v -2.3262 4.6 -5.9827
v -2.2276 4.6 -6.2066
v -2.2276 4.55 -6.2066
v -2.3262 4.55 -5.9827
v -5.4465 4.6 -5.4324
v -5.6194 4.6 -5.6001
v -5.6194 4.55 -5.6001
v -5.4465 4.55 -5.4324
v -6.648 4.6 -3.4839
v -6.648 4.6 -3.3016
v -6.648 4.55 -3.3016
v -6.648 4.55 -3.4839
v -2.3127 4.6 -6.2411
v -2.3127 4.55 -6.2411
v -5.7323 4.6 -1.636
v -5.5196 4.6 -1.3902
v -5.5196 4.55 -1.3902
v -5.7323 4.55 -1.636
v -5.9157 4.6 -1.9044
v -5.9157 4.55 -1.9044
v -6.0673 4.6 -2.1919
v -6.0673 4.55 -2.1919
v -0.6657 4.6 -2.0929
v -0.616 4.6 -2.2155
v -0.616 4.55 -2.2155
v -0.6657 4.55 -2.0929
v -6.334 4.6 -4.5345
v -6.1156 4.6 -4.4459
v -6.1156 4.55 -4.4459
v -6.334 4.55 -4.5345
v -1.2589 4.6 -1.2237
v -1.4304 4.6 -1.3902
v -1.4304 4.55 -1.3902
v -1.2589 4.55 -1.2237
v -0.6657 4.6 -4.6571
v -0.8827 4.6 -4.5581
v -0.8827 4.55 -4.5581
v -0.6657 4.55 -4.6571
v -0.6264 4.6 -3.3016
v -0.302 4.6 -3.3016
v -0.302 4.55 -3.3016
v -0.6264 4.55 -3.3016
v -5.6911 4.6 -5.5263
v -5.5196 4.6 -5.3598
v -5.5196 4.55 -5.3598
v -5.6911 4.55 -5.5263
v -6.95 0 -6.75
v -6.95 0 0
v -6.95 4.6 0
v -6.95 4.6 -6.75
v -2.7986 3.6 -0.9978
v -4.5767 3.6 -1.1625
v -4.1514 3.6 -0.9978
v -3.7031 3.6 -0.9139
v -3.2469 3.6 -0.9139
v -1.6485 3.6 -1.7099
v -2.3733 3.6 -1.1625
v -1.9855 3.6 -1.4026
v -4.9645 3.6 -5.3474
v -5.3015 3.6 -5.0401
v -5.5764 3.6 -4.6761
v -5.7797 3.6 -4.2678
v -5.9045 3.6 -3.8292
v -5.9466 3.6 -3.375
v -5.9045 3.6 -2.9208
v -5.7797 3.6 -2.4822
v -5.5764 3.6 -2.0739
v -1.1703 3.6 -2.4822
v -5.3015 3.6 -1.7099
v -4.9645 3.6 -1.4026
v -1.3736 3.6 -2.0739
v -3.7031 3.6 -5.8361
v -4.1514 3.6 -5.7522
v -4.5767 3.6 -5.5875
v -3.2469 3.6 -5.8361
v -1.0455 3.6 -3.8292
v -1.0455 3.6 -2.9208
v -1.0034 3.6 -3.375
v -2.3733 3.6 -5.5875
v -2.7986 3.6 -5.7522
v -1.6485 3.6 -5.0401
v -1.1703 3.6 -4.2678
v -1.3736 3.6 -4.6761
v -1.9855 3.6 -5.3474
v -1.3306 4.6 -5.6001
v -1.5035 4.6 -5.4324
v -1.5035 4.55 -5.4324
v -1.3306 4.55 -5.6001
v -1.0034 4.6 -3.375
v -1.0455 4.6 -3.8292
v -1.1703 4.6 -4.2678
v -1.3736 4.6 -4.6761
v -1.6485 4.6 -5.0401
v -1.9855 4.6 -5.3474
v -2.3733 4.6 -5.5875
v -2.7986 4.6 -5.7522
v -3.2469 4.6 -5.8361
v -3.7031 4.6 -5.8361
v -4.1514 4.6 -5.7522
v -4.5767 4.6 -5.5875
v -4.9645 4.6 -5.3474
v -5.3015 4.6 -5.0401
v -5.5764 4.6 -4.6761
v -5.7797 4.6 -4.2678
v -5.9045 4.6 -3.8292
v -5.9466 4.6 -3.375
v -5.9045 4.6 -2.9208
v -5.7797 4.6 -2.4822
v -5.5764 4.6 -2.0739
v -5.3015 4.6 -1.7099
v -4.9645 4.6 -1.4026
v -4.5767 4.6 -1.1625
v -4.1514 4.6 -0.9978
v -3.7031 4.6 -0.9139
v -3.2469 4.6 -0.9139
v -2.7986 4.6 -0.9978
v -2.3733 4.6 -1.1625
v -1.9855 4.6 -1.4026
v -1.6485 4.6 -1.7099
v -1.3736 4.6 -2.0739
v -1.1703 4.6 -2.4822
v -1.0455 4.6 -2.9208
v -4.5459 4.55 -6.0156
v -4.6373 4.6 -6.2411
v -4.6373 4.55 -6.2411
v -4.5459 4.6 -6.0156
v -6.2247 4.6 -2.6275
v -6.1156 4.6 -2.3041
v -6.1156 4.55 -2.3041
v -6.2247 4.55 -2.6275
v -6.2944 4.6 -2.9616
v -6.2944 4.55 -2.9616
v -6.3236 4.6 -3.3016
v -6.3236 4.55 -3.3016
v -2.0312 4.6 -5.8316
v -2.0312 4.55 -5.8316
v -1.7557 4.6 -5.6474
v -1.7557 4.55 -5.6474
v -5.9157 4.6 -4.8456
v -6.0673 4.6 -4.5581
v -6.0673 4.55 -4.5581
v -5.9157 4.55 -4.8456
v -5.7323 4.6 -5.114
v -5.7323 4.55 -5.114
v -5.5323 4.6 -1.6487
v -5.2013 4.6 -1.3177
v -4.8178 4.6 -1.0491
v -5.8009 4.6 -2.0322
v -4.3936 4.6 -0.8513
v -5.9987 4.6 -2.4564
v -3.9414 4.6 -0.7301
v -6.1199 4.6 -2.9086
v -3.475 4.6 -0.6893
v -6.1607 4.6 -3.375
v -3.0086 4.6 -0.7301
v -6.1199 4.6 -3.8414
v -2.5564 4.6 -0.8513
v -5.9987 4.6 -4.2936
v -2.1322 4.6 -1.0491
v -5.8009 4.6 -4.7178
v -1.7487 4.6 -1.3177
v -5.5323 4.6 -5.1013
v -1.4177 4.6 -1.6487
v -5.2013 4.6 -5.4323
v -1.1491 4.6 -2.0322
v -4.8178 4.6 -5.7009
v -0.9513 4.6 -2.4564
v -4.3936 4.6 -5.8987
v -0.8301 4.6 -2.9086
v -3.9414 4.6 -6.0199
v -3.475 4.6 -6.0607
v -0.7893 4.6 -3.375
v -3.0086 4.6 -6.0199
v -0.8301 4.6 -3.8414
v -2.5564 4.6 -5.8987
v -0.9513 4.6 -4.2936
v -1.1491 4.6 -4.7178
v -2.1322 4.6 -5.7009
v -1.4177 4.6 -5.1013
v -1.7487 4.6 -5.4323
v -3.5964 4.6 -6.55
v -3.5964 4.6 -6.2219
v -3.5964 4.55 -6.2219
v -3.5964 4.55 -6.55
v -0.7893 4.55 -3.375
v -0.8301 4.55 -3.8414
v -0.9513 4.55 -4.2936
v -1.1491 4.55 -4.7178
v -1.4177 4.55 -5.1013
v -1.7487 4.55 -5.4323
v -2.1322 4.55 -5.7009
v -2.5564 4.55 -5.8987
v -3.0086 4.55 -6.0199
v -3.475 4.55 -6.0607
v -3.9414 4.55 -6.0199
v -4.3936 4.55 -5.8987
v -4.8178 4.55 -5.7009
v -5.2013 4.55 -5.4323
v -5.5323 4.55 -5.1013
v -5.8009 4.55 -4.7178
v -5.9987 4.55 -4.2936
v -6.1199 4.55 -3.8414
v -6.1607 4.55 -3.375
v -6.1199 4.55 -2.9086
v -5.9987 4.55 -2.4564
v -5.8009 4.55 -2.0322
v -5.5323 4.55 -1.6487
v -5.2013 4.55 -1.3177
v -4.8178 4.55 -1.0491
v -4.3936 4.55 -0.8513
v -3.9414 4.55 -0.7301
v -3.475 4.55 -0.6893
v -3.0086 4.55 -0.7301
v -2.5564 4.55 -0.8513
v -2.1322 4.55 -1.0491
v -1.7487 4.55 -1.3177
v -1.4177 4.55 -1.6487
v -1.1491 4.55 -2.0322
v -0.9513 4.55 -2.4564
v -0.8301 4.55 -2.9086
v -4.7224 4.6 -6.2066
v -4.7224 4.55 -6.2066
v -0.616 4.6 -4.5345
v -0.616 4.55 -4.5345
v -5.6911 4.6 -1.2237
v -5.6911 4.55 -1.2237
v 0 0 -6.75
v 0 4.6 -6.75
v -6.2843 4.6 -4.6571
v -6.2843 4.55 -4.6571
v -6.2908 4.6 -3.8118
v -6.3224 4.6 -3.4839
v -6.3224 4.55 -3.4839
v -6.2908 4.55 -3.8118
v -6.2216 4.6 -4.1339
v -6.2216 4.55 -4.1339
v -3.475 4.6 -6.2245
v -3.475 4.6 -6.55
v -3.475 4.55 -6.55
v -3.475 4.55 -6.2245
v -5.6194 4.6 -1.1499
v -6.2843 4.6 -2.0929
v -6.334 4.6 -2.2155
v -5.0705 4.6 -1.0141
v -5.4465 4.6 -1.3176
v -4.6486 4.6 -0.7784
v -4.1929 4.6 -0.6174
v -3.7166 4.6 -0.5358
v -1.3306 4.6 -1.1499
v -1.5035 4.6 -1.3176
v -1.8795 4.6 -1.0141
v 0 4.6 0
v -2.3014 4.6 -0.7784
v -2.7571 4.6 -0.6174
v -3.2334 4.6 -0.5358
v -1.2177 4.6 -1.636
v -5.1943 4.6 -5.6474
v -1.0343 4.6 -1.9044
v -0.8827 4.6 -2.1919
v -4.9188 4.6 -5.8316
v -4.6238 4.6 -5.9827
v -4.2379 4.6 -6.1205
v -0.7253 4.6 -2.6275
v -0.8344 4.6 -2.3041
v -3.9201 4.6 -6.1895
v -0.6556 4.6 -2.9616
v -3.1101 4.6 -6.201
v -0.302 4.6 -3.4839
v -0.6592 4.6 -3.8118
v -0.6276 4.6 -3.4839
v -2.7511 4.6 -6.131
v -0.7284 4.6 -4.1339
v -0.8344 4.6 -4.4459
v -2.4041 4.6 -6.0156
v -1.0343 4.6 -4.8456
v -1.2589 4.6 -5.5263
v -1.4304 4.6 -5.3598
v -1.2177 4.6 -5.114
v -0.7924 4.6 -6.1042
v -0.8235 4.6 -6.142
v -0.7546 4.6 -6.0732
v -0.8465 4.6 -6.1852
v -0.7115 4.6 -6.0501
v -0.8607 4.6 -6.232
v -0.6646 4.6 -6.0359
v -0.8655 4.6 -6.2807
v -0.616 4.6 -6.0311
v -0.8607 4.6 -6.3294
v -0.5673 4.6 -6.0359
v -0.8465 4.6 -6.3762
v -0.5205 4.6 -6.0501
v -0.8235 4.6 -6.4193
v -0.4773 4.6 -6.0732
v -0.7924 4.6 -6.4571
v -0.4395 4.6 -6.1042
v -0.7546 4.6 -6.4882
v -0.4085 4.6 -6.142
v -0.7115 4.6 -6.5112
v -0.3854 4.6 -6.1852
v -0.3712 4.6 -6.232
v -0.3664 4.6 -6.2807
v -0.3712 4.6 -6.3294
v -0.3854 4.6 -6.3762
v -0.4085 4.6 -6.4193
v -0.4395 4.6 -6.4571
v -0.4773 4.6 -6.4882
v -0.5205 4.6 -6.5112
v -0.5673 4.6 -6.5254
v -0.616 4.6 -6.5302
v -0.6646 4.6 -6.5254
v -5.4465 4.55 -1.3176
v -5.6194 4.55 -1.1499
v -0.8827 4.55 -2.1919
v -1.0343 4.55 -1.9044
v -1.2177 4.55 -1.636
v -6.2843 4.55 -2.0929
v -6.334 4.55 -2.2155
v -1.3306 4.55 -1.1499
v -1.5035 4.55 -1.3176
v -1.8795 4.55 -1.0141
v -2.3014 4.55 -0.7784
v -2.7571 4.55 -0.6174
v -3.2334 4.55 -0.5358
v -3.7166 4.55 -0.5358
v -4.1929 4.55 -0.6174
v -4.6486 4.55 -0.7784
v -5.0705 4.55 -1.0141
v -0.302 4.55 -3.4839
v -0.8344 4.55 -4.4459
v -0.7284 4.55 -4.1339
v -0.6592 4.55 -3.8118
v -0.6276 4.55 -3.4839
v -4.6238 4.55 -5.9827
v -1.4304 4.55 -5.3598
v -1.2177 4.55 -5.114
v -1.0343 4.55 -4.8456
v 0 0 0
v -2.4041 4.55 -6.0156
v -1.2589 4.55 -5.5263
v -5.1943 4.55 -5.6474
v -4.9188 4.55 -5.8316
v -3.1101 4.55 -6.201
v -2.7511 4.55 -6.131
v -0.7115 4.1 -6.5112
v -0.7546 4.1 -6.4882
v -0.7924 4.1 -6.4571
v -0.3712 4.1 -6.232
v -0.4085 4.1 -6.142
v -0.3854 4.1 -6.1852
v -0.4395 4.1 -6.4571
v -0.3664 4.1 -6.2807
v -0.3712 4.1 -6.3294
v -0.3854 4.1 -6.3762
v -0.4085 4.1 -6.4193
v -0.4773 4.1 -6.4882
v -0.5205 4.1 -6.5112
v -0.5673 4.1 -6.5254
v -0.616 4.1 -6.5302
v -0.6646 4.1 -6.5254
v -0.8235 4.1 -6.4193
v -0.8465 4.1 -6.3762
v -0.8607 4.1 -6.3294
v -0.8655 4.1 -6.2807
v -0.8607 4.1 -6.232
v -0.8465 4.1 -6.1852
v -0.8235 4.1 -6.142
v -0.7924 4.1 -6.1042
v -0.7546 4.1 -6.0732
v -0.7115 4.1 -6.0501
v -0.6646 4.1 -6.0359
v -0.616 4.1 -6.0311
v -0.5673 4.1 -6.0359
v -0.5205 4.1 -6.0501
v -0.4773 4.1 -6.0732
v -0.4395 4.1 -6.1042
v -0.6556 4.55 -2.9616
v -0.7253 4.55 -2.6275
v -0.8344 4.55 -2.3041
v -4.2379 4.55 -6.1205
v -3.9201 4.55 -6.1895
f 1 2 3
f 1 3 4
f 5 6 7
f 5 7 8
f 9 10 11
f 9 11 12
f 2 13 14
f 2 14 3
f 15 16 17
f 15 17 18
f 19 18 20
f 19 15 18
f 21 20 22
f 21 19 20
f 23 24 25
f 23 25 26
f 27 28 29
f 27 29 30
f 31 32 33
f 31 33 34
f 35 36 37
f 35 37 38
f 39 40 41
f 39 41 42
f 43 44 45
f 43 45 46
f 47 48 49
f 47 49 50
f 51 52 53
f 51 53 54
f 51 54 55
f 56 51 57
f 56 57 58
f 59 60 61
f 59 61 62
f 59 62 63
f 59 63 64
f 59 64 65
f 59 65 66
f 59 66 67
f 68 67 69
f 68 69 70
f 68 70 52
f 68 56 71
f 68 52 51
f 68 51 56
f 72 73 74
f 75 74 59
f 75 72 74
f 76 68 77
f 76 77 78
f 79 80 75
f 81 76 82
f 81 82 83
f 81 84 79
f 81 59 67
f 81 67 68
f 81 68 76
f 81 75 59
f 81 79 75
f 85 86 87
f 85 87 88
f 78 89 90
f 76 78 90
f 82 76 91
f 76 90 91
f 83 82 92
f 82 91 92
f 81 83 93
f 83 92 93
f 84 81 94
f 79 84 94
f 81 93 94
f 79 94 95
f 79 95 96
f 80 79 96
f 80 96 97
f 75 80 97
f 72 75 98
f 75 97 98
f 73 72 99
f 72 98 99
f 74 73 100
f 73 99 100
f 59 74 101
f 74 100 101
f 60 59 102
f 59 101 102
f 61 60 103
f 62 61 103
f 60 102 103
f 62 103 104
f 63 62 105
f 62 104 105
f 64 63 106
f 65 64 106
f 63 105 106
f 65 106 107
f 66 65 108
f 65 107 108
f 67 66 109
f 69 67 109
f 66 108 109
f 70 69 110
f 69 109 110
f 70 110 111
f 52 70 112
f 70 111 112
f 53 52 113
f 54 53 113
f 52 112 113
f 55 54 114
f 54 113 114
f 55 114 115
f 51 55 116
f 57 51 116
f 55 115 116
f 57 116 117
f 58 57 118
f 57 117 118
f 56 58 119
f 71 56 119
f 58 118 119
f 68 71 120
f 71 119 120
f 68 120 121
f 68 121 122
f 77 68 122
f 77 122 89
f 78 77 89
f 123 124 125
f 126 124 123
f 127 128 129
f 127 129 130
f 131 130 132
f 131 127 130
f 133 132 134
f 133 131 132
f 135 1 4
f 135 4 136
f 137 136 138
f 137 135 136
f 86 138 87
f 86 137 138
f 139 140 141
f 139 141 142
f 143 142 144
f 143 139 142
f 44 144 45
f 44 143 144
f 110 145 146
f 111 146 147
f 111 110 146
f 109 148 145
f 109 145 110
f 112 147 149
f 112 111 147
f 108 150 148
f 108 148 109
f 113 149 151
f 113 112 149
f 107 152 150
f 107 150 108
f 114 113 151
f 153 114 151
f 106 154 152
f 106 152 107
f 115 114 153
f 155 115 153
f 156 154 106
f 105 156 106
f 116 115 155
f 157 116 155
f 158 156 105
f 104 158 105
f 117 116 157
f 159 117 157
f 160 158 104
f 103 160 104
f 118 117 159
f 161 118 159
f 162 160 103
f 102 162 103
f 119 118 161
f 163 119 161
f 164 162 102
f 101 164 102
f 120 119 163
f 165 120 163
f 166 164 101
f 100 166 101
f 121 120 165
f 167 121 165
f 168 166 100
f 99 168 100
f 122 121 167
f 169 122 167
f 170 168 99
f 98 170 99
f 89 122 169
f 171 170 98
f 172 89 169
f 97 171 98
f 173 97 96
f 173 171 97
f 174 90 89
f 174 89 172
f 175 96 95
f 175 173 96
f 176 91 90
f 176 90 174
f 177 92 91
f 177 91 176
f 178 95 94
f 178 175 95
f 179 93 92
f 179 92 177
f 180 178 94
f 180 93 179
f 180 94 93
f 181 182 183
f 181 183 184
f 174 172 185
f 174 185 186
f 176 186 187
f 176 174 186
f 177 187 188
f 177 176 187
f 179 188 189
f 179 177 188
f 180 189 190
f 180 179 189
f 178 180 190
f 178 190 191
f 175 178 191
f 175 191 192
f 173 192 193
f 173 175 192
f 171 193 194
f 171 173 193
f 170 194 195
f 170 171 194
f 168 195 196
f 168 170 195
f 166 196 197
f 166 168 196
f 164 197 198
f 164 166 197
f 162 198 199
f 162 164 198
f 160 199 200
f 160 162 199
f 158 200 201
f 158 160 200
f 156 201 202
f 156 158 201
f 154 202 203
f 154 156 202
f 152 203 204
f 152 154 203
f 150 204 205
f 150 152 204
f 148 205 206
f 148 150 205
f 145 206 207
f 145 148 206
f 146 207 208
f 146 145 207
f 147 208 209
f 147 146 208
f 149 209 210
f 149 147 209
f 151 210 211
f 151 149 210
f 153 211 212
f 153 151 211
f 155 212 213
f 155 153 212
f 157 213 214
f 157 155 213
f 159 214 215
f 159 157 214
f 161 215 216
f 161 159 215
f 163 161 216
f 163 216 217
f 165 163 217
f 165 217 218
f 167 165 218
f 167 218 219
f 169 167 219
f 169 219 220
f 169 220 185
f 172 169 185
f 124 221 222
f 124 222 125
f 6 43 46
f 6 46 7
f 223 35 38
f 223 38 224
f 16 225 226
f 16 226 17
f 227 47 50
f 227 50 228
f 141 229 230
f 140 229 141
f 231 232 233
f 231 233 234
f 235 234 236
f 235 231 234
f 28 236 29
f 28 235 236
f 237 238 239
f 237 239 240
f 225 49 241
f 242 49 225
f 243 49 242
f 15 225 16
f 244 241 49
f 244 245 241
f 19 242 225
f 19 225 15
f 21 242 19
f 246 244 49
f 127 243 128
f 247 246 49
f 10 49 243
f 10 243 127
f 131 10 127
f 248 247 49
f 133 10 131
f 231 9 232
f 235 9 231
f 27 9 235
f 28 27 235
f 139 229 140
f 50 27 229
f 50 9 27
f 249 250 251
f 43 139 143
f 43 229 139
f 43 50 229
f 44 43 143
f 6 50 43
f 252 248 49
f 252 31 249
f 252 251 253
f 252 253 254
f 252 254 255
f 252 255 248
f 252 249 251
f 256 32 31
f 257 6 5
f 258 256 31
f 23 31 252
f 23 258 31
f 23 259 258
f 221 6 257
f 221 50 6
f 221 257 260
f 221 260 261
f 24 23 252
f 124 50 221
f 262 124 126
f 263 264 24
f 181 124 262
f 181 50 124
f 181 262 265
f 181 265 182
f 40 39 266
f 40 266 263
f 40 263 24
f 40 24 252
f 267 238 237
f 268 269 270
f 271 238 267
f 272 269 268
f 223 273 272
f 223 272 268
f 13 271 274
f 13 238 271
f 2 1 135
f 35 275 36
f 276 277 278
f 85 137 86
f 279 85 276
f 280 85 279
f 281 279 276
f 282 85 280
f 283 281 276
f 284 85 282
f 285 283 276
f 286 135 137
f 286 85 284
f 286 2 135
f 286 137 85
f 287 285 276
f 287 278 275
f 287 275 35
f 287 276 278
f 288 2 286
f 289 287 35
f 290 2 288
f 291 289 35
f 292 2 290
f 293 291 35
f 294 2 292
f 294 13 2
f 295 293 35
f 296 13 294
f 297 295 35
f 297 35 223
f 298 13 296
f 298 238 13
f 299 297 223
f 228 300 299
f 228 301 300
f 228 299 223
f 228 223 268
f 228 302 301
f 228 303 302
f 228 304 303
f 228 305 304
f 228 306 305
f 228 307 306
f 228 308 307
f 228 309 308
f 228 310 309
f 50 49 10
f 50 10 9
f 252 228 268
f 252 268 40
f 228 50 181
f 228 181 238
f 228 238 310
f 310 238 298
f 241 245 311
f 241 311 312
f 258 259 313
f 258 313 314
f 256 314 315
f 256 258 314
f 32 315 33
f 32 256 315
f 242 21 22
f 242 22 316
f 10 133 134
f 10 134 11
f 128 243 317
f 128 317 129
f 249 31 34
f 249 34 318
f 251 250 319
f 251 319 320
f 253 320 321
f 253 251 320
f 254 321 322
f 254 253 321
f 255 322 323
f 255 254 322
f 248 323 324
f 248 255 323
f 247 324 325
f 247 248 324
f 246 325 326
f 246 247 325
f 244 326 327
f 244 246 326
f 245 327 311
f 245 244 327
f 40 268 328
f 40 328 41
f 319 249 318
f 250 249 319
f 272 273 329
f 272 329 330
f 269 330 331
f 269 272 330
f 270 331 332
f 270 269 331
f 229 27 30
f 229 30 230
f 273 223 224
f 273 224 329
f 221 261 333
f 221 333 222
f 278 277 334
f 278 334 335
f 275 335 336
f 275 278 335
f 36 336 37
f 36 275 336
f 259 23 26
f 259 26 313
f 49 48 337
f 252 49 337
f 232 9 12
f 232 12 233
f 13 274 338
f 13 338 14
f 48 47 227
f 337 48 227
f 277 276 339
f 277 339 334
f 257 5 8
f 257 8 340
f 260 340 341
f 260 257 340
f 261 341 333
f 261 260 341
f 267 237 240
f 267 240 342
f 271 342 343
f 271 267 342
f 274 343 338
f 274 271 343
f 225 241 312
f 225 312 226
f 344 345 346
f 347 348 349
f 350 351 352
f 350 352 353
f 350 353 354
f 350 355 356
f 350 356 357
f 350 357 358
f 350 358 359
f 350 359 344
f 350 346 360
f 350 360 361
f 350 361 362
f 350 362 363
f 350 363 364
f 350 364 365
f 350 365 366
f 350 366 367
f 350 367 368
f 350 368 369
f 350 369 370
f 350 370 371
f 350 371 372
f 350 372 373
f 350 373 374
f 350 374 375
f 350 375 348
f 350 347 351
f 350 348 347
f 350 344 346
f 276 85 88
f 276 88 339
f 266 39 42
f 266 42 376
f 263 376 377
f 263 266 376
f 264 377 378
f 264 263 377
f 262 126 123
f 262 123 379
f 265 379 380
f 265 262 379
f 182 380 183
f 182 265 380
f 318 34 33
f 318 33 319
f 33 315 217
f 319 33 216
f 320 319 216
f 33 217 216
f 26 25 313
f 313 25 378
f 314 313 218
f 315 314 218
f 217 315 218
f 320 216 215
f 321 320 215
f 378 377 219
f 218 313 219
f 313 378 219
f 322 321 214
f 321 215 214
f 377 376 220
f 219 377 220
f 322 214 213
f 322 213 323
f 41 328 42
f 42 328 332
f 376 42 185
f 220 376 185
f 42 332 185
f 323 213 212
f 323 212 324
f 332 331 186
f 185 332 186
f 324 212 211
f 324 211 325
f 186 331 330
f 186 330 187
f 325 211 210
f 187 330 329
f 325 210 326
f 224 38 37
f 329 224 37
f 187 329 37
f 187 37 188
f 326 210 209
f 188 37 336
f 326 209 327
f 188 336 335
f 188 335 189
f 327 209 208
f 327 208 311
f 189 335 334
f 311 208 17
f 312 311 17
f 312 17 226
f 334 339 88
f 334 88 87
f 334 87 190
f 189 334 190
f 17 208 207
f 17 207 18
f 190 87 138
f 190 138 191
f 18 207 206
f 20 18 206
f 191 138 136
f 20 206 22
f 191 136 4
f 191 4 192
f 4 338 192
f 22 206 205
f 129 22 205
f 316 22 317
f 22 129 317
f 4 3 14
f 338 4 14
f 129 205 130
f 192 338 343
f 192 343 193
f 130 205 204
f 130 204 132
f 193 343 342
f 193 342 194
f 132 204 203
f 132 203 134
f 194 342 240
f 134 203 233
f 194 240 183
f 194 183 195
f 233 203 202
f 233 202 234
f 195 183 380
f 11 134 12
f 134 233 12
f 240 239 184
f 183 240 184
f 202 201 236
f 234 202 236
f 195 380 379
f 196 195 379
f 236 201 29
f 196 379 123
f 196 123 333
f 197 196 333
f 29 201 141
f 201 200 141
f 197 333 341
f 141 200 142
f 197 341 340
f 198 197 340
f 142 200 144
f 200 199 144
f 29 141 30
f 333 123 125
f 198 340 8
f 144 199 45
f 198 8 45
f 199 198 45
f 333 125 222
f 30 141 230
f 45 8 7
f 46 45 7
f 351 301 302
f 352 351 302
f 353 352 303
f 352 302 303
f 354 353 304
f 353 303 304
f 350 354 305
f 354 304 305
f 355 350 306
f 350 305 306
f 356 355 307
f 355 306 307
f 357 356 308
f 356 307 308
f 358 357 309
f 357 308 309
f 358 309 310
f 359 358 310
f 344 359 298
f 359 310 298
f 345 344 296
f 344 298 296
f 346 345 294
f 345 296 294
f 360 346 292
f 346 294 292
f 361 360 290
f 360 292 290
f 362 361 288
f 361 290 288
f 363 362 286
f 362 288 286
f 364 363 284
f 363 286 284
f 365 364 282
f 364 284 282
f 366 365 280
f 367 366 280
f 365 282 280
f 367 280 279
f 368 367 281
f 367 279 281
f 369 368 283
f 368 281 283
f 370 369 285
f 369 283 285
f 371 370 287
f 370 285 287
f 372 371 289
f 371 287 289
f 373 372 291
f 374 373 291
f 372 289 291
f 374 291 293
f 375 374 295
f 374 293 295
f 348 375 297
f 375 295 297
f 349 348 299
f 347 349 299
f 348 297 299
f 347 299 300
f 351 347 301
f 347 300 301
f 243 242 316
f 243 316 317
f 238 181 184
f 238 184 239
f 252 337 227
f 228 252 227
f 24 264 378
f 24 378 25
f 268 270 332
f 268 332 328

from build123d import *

# Parameters (mm, degrees)
SKETCH1_W           = 6.95
SKETCH1_H           = 6.75
BOSS_EXTRUDE1_DEPTH = 4.6
SKETCH3_3_R         = 2.685665185
CUT_EXTRUDE3_DEPTH  = 0.05
SKETCH3_4_R         = 2.471595258
CUT_EXTRUDE4_DEPTH  = 1
SKETCH3_R           = 0.249549506
CUT_EXTRUDE5_DEPTH  = 0.5


with BuildPart() as part:
    # Sketch1 → Boss-Extrude1 (new body)
    with BuildSketch(Plane(origin=(0, 0, 0), x_dir=(1, 0, 0), z_dir=(0, 1, 0))):
        with Locations((-3.475, 3.375)):
            Rectangle(SKETCH1_W, SKETCH1_H)
    extrude(amount=BOSS_EXTRUDE1_DEPTH)

    # Sketch3<3> → Cut-Extrude3 (cut)
    with BuildSketch(Plane(origin=(0, 4.6, 0), x_dir=(1, 0, 0), z_dir=(0, 1, 0))):
        with BuildLine():
            Line((-2.404106083, 6.015623034), (-2.312667033, 6.241094539))
            Line((-2.312667033, 6.241094539), (-2.227566093, 6.2065822))
            Line((-2.227566093, 6.2065822), (-2.326206207, 5.982676477))
            ThreePointArc((-2.326206207, 5.982676477), (-1.890758445, 5.743519048), (-1.50346617, 5.432366798))
            Line((-1.50346617, 5.432366798), (-1.330630635, 5.60014662))
            Line((-1.330630635, 5.60014662), (-1.258910519, 5.52626536))
            Line((-1.258910519, 5.52626536), (-1.430410767, 5.359781765))
            ThreePointArc((-1.430410767, 5.359781765), (-1.122158532, 4.982432988), (-0.882700889, 4.558084573))
            Line((-0.882700889, 4.558084573), (-0.665701499, 4.657119684))
            Line((-0.665701499, 4.657119684), (-0.615961925, 4.534471247))
            Line((-0.615961925, 4.534471247), (-0.834376966, 4.445893916))
            ThreePointArc((-0.834376966, 4.445893916), (-0.689137564, 3.973894209), (-0.627572536, 3.483906499))
            Line((-0.627572536, 3.483906499), (-0.302033066, 3.483906499))
            Line((-0.302033066, 3.483906499), (-0.302033066, 3.301563496))
            Line((-0.302033066, 3.301563496), (-0.626437053, 3.301563496))
            ThreePointArc((-0.626437053, 3.301563496), (-0.685462224, 2.793465152), (-0.834376966, 2.304106084))
            Line((-0.834376966, 2.304106084), (-0.615961925, 2.215528753))
            Line((-0.615961925, 2.215528753), (-0.665701499, 2.092880316))
            Line((-0.665701499, 2.092880316), (-0.882700889, 2.191915427))
            ThreePointArc((-0.882700889, 2.191915427), (-1.122158532, 1.767567012), (-1.430410767, 1.390218235))
            Line((-1.430410767, 1.390218235), (-1.258910519, 1.22373464))
            Line((-1.258910519, 1.22373464), (-1.330630635, 1.14985338))
            Line((-1.330630635, 1.14985338), (-1.50346617, 1.317633202))
            ThreePointArc((-1.50346617, 1.317633202), (-3.475, 0.525490606), (-5.44653383, 1.317633202))
            Line((-5.44653383, 1.317633202), (-5.619369365, 1.14985338))
            Line((-5.619369365, 1.14985338), (-5.691089481, 1.22373464))
            Line((-5.691089481, 1.22373464), (-5.519589233, 1.390218235))
            ThreePointArc((-5.519589233, 1.390218235), (-5.827841468, 1.767567012), (-6.067299111, 2.191915427))
            Line((-6.067299111, 2.191915427), (-6.284298501, 2.092880316))
            Line((-6.284298501, 2.092880316), (-6.334038075, 2.215528753))
            Line((-6.334038075, 2.215528753), (-6.115623034, 2.304106084))
            ThreePointArc((-6.115623034, 2.304106084), (-6.264537776, 2.793465152), (-6.323562947, 3.301563496))
            Line((-6.323562947, 3.301563496), (-6.647966934, 3.301563496))
            Line((-6.647966934, 3.301563496), (-6.647966934, 3.483906499))
            Line((-6.647966934, 3.483906499), (-6.322427464, 3.483906499))
            ThreePointArc((-6.322427464, 3.483906499), (-6.260862436, 3.973894209), (-6.115623034, 4.445893916))
            Line((-6.115623034, 4.445893916), (-6.334038075, 4.534471247))
            Line((-6.334038075, 4.534471247), (-6.284298501, 4.657119684))
            Line((-6.284298501, 4.657119684), (-6.067299111, 4.558084573))
            ThreePointArc((-6.067299111, 4.558084573), (-5.827841468, 4.982432988), (-5.519589233, 5.359781765))
            Line((-5.519589233, 5.359781765), (-5.691089481, 5.52626536))
            Line((-5.691089481, 5.52626536), (-5.619369365, 5.60014662))
            Line((-5.619369365, 5.60014662), (-5.44653383, 5.432366798))
            ThreePointArc((-5.44653383, 5.432366798), (-5.059241555, 5.743519048), (-4.623793793, 5.982676477))
            Line((-4.623793793, 5.982676477), (-4.722433907, 6.2065822))
            Line((-4.722433907, 6.2065822), (-4.637332967, 6.241094539))
            Line((-4.637332967, 6.241094539), (-4.545893917, 6.015623034))
            ThreePointArc((-4.545893917, 6.015623034), (-4.079985397, 6.159546005), (-3.596359951, 6.221923875))
            Line((-3.596359951, 6.221923875), (-3.596359951, 6.550048868))
            Line((-3.596359951, 6.550048868), (-3.475, 6.550048868))
            Line((-3.475, 6.550048868), (-3.475, 6.224509394))
            ThreePointArc((-3.475, 6.224509394), (-2.929461896, 6.171800308), (-2.404106083, 6.015623034))
        make_face()
        with Locations((-3.475, 3.375)):
            Circle(SKETCH3_3_R, mode=Mode.SUBTRACT)
    extrude(amount=-CUT_EXTRUDE3_DEPTH, mode=Mode.SUBTRACT)

    # Sketch3<4> → Cut-Extrude4 (cut)
    with BuildSketch(Plane(origin=(0, 4.6, 0), x_dir=(1, 0, 0), z_dir=(0, 1, 0))):
        with Locations((-3.475, 3.375)):
            Circle(SKETCH3_4_R)
    extrude(amount=-CUT_EXTRUDE4_DEPTH, mode=Mode.SUBTRACT)

    # Sketch3 → Cut-Extrude5 (cut)
    with BuildSketch(Plane(origin=(0, 4.6, 0), x_dir=(1, 0, 0), z_dir=(0, 1, 0))):
        with Locations((-0.615961925, 6.280685908)):
            Circle(SKETCH3_R)
    extrude(amount=-CUT_EXTRUDE5_DEPTH, mode=Mode.SUBTRACT)


solid = part.part
